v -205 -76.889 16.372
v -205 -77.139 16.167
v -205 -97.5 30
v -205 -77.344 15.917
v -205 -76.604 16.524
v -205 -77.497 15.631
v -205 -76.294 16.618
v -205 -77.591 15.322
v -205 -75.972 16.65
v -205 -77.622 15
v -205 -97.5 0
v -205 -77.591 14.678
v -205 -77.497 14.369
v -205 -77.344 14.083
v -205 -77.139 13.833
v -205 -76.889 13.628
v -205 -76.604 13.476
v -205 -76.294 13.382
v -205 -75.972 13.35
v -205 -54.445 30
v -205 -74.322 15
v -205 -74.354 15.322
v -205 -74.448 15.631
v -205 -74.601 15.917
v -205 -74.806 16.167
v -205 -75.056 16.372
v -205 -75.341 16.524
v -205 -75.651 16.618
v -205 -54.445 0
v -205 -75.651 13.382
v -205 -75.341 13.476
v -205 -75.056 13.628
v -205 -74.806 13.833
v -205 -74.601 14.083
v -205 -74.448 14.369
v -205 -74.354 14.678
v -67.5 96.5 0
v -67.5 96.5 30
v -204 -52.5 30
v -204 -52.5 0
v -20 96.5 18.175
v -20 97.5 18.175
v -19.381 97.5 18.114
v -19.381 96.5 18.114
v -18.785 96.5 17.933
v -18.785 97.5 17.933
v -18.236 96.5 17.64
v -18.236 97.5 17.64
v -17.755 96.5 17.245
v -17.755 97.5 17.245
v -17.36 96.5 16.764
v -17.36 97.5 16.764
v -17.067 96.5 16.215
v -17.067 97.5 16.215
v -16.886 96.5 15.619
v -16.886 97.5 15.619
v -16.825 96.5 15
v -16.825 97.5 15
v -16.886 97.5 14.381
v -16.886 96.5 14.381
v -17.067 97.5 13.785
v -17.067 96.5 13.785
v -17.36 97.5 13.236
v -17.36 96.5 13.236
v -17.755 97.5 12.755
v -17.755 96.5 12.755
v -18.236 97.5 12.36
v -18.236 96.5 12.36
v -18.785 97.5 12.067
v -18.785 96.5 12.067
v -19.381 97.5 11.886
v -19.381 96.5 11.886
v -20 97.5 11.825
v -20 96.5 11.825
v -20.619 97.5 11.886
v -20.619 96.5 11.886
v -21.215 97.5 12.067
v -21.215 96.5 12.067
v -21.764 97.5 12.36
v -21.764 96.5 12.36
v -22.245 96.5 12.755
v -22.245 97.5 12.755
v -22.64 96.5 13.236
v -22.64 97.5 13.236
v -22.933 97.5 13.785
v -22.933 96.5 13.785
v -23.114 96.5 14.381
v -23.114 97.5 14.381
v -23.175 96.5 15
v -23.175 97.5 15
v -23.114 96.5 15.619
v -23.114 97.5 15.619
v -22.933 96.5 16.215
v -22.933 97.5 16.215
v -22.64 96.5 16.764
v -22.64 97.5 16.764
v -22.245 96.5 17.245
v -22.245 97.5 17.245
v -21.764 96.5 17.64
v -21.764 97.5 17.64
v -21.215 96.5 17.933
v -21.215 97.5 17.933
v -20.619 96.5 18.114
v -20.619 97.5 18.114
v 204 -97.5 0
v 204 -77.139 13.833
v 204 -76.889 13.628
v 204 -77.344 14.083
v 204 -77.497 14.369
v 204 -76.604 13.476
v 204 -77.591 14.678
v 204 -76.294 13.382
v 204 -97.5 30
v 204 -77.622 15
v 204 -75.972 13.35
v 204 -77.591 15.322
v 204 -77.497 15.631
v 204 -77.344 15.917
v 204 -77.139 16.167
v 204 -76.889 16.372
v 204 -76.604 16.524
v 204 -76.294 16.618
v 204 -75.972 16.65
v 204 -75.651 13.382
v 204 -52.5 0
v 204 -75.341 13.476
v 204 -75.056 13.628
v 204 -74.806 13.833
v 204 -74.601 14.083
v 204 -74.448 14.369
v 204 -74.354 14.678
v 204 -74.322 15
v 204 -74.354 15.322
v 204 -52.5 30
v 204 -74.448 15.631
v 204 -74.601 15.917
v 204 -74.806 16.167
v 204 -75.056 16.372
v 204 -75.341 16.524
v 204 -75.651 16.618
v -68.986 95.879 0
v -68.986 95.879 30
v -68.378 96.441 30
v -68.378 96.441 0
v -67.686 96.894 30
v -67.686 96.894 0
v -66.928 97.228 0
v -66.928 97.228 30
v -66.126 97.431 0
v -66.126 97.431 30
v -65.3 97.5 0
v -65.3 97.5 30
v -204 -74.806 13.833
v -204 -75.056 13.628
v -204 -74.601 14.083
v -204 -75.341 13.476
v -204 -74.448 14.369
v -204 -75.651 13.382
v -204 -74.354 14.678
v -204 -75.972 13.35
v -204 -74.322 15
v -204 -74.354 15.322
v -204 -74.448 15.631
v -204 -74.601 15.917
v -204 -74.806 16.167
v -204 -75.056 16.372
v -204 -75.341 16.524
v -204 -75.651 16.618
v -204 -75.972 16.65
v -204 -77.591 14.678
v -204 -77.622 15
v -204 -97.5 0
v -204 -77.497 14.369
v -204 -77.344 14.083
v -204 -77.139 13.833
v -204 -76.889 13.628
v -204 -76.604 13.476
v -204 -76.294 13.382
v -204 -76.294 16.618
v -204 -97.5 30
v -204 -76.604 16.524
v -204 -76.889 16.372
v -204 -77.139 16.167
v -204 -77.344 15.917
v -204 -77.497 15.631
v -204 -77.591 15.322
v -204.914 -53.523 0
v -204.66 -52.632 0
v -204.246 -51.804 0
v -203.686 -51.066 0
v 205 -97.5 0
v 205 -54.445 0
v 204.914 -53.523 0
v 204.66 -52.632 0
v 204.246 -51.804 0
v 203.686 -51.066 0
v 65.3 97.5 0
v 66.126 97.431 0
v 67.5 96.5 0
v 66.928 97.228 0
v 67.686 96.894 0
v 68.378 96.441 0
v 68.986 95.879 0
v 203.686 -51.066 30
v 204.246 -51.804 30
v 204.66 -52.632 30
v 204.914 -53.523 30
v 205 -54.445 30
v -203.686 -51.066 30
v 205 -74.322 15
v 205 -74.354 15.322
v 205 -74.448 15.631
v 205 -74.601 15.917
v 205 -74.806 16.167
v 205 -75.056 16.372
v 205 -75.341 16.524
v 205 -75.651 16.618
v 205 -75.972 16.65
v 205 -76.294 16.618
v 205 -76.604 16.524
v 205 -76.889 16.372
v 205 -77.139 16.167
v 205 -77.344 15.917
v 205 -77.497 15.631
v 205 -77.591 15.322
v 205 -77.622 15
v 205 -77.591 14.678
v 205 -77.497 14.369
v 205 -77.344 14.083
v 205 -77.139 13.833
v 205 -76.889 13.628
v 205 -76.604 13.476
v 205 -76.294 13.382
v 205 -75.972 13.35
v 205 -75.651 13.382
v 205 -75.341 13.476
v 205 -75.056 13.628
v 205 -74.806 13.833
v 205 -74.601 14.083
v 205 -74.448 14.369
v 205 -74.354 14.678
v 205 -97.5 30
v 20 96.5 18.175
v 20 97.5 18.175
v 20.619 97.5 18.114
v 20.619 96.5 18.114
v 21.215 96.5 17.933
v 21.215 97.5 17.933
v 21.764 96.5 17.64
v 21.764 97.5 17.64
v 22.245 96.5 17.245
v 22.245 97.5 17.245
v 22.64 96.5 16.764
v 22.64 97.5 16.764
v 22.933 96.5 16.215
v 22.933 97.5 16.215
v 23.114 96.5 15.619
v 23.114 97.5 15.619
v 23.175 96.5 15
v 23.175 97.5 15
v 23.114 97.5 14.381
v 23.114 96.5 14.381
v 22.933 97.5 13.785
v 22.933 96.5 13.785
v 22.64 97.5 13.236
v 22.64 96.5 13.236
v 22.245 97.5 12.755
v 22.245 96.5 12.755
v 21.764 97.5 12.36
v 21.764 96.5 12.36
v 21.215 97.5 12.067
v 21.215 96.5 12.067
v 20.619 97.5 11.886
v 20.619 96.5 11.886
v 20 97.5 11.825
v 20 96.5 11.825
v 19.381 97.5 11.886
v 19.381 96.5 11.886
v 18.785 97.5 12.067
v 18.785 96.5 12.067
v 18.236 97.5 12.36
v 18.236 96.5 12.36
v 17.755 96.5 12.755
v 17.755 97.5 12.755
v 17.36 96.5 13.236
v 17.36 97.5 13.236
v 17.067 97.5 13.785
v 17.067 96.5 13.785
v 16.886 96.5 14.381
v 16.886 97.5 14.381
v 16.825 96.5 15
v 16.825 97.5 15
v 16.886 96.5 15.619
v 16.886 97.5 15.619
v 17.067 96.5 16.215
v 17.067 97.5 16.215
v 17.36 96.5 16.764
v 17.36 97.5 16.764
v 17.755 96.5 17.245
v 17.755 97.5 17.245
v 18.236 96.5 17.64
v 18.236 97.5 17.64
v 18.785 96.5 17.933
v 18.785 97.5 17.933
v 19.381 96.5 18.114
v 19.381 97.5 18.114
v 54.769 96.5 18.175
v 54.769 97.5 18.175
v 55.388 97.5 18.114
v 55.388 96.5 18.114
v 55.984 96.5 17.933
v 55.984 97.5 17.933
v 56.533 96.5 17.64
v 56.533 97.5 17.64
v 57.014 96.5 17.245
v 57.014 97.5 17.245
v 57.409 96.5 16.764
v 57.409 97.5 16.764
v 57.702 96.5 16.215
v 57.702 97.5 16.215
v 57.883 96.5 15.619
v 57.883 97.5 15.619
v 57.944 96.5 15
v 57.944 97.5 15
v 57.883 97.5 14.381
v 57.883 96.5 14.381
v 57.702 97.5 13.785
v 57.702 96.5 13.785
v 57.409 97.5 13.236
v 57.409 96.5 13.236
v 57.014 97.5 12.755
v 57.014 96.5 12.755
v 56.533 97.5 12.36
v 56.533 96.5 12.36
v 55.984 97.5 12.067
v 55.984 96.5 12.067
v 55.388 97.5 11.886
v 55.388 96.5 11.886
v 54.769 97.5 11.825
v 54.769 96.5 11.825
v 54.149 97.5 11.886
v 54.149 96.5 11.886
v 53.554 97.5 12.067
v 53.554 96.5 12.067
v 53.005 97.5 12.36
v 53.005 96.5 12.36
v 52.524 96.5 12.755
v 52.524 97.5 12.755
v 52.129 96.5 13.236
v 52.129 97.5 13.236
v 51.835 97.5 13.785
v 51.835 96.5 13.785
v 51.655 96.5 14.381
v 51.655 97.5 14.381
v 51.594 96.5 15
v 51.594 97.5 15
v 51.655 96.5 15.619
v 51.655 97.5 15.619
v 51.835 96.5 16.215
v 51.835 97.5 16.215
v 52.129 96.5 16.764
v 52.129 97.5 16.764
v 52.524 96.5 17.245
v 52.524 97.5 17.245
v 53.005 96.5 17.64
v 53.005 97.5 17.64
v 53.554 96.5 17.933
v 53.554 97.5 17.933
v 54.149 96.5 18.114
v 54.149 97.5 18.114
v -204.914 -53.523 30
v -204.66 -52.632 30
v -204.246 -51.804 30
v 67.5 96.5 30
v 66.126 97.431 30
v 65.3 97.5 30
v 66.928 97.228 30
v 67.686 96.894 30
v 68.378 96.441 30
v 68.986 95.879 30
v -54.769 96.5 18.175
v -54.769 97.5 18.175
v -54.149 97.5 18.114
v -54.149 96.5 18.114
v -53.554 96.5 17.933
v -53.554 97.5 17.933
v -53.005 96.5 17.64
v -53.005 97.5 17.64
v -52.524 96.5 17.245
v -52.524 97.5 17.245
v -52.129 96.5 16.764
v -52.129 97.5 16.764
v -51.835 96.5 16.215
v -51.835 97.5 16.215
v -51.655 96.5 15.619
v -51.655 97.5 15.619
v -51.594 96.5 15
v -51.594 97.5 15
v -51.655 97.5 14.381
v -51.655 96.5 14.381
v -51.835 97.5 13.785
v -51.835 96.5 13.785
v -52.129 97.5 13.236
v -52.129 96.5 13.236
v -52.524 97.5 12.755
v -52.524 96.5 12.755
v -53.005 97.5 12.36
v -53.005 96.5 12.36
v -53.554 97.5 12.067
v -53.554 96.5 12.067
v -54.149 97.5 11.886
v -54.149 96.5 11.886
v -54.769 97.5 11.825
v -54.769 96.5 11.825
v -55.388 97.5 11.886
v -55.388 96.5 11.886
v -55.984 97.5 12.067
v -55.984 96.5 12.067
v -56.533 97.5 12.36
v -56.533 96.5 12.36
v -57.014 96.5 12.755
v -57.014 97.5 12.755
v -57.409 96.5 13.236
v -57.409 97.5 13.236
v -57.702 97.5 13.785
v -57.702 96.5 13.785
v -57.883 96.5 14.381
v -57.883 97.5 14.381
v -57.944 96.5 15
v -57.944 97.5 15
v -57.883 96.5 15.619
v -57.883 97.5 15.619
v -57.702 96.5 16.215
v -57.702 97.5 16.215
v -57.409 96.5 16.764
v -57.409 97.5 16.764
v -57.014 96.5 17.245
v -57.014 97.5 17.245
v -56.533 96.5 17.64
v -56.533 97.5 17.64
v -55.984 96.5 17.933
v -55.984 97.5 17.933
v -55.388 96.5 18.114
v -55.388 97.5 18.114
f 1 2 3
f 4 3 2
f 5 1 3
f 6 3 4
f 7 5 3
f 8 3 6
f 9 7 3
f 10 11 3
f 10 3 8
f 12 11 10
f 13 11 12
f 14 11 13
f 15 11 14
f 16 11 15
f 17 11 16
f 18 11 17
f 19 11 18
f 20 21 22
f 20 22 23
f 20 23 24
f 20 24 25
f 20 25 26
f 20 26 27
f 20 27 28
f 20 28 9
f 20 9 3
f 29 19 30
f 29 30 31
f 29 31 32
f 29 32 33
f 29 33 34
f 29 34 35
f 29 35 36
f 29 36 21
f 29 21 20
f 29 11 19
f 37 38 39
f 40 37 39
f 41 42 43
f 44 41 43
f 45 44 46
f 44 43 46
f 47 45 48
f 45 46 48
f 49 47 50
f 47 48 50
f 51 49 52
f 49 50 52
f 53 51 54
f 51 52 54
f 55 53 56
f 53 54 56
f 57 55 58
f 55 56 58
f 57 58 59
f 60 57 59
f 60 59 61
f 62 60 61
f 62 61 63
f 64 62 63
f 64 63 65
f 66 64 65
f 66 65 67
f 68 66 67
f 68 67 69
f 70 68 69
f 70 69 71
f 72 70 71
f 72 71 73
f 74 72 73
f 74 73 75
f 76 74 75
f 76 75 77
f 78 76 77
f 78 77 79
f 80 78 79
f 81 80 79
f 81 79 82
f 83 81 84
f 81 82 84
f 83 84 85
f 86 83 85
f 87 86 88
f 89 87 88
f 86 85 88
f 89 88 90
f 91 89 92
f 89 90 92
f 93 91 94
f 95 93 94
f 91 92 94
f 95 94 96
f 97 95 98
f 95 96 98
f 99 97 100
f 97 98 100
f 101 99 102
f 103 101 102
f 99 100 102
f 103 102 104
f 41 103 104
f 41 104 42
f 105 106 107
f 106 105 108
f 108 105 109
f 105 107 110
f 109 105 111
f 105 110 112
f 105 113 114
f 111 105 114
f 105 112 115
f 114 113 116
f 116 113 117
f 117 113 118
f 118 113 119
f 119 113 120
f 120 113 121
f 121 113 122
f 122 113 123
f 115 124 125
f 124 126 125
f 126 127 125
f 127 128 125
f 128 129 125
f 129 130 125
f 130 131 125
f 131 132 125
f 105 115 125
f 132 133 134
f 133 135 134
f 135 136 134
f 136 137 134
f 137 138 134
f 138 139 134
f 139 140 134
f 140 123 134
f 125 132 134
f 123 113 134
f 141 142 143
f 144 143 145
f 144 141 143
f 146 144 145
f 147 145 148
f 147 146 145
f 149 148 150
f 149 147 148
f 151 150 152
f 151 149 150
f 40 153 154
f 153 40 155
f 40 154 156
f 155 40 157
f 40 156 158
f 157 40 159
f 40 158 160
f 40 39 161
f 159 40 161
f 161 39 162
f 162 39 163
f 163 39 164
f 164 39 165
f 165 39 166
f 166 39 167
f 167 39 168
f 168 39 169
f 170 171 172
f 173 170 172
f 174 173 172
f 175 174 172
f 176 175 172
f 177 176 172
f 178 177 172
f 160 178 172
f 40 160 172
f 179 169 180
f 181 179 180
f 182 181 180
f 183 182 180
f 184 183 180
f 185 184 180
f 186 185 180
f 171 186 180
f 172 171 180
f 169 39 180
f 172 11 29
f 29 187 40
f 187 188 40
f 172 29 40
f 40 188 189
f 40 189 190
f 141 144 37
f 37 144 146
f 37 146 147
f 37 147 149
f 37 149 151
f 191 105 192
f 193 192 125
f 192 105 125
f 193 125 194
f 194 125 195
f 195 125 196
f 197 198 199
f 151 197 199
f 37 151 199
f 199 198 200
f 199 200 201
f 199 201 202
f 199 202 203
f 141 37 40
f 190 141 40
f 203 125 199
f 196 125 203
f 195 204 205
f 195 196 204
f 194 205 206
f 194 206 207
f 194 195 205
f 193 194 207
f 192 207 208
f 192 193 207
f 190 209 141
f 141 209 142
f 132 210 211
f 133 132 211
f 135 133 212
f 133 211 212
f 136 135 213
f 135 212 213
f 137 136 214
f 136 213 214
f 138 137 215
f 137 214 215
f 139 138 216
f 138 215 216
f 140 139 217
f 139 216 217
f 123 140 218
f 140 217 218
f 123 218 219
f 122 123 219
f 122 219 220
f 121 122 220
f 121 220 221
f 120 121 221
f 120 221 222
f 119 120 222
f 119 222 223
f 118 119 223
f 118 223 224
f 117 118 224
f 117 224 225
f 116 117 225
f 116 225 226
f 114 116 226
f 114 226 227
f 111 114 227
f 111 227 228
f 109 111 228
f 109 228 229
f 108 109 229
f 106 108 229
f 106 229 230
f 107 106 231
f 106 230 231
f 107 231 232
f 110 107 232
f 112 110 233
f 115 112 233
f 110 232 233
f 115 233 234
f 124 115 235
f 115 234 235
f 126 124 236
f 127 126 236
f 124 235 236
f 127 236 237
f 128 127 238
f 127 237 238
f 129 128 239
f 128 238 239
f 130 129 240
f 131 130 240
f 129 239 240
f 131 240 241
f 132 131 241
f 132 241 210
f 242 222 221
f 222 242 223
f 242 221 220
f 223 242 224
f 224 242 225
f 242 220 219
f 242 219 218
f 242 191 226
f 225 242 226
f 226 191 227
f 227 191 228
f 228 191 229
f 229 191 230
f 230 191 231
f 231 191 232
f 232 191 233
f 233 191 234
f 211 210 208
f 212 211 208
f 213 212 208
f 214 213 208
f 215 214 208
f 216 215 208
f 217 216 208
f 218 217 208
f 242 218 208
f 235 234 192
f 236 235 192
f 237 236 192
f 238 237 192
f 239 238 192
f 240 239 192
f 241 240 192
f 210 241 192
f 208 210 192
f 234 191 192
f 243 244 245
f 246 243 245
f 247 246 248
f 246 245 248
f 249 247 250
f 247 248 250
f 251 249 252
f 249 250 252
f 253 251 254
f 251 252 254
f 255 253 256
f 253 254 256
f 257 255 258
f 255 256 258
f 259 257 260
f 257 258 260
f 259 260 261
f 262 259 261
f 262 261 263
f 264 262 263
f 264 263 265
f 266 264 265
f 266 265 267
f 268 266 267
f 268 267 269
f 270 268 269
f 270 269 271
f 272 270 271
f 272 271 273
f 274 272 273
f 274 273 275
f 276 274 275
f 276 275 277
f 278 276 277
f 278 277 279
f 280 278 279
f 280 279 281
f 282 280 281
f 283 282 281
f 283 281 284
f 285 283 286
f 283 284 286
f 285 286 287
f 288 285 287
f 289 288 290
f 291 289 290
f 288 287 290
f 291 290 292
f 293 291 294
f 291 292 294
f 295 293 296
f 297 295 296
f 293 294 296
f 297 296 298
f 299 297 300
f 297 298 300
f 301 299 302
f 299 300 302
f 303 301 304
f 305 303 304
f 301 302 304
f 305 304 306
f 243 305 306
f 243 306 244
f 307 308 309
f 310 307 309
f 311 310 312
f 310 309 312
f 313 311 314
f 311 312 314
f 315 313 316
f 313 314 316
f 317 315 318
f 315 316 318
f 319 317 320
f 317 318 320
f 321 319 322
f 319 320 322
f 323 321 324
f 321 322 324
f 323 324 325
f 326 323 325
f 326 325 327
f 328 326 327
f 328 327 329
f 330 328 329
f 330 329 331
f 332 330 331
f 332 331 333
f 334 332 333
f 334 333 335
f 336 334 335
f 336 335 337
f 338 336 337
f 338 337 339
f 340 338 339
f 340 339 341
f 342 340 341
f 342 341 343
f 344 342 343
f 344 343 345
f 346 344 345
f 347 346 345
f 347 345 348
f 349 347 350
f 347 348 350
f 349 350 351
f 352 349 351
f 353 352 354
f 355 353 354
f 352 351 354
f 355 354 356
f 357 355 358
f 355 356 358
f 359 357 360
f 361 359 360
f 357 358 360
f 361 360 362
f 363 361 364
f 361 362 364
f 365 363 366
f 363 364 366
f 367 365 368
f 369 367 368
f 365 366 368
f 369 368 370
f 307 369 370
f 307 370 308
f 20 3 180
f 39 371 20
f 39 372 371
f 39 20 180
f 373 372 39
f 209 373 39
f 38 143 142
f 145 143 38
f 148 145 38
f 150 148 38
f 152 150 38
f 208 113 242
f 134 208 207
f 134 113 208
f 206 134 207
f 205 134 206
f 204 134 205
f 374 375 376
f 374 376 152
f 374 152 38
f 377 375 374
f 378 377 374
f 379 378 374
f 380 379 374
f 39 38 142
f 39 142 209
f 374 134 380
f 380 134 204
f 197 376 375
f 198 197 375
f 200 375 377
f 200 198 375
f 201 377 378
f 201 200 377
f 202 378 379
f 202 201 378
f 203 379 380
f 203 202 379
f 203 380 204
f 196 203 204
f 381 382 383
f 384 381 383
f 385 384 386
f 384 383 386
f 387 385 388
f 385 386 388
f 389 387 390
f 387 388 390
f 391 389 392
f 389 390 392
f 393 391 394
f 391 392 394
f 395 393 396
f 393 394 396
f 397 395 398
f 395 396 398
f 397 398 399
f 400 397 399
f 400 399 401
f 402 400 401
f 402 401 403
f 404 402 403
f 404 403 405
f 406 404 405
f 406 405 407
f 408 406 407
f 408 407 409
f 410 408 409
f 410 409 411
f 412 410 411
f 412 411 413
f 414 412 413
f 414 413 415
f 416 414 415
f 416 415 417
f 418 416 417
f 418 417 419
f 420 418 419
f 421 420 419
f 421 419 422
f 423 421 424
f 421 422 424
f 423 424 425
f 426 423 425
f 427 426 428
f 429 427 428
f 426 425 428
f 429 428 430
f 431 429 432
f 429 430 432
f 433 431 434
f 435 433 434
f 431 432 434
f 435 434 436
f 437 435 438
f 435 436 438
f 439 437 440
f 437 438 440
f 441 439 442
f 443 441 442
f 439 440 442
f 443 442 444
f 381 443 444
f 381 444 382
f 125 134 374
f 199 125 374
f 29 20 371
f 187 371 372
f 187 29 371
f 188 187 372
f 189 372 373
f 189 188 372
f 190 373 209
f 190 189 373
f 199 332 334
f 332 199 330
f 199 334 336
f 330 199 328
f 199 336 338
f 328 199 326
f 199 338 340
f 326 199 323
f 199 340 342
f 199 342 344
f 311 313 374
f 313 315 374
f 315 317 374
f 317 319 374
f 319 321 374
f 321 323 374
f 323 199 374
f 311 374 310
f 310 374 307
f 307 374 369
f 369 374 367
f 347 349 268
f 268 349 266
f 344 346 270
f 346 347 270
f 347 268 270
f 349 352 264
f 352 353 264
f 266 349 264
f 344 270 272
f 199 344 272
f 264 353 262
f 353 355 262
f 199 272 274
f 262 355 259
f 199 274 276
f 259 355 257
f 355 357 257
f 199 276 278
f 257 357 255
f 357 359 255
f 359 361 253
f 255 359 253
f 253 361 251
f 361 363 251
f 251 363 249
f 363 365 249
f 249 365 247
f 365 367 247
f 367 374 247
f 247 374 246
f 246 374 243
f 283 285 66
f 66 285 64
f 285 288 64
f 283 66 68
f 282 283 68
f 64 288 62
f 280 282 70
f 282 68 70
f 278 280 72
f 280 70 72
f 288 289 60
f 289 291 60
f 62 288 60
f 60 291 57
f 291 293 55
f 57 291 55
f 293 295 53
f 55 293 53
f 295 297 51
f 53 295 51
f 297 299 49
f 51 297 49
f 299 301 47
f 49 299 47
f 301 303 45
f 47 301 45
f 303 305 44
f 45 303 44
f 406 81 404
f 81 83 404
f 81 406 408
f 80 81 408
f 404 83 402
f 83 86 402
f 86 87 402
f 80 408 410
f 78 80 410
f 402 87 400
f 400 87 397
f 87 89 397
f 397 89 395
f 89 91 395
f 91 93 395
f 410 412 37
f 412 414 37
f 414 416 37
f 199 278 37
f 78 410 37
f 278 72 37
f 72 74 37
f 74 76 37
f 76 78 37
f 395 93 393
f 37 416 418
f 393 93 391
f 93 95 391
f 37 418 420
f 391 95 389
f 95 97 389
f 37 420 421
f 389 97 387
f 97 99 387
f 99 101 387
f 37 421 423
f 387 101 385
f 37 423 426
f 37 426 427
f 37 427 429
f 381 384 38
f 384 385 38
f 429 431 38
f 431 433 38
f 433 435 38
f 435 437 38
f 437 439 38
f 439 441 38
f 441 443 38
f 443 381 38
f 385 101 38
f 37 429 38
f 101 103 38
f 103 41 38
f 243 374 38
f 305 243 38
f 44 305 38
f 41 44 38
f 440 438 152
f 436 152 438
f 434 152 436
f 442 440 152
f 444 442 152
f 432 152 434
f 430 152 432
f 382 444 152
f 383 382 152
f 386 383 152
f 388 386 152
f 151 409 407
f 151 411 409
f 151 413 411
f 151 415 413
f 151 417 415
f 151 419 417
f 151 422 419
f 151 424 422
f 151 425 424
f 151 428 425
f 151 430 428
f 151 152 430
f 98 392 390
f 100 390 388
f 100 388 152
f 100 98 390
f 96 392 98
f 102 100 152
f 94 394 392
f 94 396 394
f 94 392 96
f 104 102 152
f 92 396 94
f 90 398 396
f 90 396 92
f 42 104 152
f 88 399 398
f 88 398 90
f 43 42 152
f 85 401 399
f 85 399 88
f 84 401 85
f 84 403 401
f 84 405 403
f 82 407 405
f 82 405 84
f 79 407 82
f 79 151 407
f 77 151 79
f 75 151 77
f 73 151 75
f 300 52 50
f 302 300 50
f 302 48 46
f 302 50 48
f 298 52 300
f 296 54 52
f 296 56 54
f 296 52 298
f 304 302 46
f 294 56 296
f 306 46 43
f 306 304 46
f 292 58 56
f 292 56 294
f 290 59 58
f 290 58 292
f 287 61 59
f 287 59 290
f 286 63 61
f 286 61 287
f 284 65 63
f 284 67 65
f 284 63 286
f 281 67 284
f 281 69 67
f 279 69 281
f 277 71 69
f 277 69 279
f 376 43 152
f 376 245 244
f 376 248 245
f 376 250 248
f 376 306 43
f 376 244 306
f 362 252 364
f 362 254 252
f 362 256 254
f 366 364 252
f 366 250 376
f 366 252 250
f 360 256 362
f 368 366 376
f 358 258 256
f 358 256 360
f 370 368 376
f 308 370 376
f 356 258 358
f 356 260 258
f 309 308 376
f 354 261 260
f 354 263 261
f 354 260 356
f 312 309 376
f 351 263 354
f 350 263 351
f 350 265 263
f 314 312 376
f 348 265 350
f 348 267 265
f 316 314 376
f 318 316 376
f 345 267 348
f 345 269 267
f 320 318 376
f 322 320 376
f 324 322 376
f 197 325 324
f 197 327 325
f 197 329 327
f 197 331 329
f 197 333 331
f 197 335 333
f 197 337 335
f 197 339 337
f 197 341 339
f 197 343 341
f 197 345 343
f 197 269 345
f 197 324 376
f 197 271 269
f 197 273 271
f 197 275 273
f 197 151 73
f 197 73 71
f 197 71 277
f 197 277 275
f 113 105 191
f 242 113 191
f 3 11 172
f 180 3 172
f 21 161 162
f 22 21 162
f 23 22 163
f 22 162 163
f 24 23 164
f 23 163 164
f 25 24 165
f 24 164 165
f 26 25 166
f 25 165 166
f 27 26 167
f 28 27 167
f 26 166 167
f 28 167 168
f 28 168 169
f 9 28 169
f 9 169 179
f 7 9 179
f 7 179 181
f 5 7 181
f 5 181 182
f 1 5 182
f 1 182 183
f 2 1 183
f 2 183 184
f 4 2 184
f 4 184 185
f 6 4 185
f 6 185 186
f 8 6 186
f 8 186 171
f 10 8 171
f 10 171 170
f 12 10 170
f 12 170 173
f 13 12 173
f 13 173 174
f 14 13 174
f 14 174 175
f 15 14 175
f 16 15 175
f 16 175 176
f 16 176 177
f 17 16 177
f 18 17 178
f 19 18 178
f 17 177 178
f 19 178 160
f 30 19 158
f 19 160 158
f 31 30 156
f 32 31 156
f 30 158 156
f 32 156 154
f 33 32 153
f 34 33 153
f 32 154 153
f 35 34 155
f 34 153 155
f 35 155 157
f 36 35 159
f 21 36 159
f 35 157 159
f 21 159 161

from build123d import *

# Parameters (mm, degrees)
SKETCH1_W           = 410
SKETCH1_H           = 195
BOSS_EXTRUDE1_DEPTH = 30
CUT_EXTRUDE1_DEPTH  = 30
CUT_EXTRUDE2_DEPTH  = 30
FILLET1_R           = 5
FILLET4_R           = 5
FILLET5_R           = 5
FILLET6_R           = 5
SKETCH4_R           = 1.65
CUT_EXTRUDE3_DEPTH  = 423.5
SKETCH5_R           = 3.175
CUT_EXTRUDE4_DEPTH  = 10


with BuildPart() as part:
    # Sketch1 → Boss-Extrude1 (new body)
    with BuildSketch(Plane.XY):
        Rectangle(SKETCH1_W, SKETCH1_H)
    extrude(amount=BOSS_EXTRUDE1_DEPTH)

    # Sketch2 → Cut-Extrude1 (cut)
    with BuildSketch(Plane.XY.offset(30)):
        Polygon((-205, 97.5), (-205, -52.5), (-67.5, 97.5), align=None)
        Polygon((205, 97.5), (67.5, 97.5), (205, -52.5), align=None)
    extrude(amount=-CUT_EXTRUDE1_DEPTH, mode=Mode.SUBTRACT)

    # Sketch3 → Cut-Extrude2 (cut)
    with BuildSketch(Plane.XY.offset(30)):
        Polygon((-67.5, 96.5), (-204, -52.5), (-204, -97.5), (204, -97.5), (204, -52.5), (67.5, 96.5), align=None)
    extrude(amount=-CUT_EXTRUDE2_DEPTH, mode=Mode.SUBTRACT)

    # Fillet1
    fillet1_edges = [part.edges().sort_by_distance(p)[0] for p in [
        (-205, -52.5, 15),
    ]]
    fillet(fillet1_edges, radius=FILLET1_R)

    # Fillet4
    fillet4_edges = [part.edges().sort_by_distance(p)[0] for p in [
        (-67.5, 97.5, 15),
    ]]
    fillet(fillet4_edges, radius=FILLET4_R)

    # Fillet5
    fillet5_edges = [part.edges().sort_by_distance(p)[0] for p in [
        (67.5, 97.5, 15),
    ]]
    fillet(fillet5_edges, radius=FILLET5_R)

    # Fillet6
    fillet6_edges = [part.edges().sort_by_distance(p)[0] for p in [
        (205, -52.5, 15),
    ]]
    fillet(fillet6_edges, radius=FILLET6_R)

    # Sketch4 → Cut-Extrude3 (cut, through all)
    with BuildSketch(Plane(origin=(205, 0, 0), x_dir=(0, 0, -1), z_dir=(1, 0, 0))):
        with Locations(Location((-15, -75.972459226, 0), (0, 0, 90))):
            Circle(SKETCH4_R)
    extrude(amount=-CUT_EXTRUDE3_DEPTH, mode=Mode.SUBTRACT)

    # Sketch5 → Cut-Extrude4 (cut)
    with BuildSketch(Plane(origin=(0, 97.5, 0), x_dir=(1, 0, 0), z_dir=(0, 1, 0))):
        with Locations(Location((-20, -15, 0), (0, 0, 270))):
            Circle(SKETCH5_R)
        with Locations(Location((20, -15, 0), (0, 0, 270))):
            Circle(SKETCH5_R)
        with Locations(Location((54.768750122, -15, 0), (0, 0, 270))):
            Circle(SKETCH5_R)
        with Locations(Location((-54.768749878, -15, 0), (0, 0, 270))):
            Circle(SKETCH5_R)
    extrude(amount=-CUT_EXTRUDE4_DEPTH, mode=Mode.SUBTRACT)


solid = part.part
